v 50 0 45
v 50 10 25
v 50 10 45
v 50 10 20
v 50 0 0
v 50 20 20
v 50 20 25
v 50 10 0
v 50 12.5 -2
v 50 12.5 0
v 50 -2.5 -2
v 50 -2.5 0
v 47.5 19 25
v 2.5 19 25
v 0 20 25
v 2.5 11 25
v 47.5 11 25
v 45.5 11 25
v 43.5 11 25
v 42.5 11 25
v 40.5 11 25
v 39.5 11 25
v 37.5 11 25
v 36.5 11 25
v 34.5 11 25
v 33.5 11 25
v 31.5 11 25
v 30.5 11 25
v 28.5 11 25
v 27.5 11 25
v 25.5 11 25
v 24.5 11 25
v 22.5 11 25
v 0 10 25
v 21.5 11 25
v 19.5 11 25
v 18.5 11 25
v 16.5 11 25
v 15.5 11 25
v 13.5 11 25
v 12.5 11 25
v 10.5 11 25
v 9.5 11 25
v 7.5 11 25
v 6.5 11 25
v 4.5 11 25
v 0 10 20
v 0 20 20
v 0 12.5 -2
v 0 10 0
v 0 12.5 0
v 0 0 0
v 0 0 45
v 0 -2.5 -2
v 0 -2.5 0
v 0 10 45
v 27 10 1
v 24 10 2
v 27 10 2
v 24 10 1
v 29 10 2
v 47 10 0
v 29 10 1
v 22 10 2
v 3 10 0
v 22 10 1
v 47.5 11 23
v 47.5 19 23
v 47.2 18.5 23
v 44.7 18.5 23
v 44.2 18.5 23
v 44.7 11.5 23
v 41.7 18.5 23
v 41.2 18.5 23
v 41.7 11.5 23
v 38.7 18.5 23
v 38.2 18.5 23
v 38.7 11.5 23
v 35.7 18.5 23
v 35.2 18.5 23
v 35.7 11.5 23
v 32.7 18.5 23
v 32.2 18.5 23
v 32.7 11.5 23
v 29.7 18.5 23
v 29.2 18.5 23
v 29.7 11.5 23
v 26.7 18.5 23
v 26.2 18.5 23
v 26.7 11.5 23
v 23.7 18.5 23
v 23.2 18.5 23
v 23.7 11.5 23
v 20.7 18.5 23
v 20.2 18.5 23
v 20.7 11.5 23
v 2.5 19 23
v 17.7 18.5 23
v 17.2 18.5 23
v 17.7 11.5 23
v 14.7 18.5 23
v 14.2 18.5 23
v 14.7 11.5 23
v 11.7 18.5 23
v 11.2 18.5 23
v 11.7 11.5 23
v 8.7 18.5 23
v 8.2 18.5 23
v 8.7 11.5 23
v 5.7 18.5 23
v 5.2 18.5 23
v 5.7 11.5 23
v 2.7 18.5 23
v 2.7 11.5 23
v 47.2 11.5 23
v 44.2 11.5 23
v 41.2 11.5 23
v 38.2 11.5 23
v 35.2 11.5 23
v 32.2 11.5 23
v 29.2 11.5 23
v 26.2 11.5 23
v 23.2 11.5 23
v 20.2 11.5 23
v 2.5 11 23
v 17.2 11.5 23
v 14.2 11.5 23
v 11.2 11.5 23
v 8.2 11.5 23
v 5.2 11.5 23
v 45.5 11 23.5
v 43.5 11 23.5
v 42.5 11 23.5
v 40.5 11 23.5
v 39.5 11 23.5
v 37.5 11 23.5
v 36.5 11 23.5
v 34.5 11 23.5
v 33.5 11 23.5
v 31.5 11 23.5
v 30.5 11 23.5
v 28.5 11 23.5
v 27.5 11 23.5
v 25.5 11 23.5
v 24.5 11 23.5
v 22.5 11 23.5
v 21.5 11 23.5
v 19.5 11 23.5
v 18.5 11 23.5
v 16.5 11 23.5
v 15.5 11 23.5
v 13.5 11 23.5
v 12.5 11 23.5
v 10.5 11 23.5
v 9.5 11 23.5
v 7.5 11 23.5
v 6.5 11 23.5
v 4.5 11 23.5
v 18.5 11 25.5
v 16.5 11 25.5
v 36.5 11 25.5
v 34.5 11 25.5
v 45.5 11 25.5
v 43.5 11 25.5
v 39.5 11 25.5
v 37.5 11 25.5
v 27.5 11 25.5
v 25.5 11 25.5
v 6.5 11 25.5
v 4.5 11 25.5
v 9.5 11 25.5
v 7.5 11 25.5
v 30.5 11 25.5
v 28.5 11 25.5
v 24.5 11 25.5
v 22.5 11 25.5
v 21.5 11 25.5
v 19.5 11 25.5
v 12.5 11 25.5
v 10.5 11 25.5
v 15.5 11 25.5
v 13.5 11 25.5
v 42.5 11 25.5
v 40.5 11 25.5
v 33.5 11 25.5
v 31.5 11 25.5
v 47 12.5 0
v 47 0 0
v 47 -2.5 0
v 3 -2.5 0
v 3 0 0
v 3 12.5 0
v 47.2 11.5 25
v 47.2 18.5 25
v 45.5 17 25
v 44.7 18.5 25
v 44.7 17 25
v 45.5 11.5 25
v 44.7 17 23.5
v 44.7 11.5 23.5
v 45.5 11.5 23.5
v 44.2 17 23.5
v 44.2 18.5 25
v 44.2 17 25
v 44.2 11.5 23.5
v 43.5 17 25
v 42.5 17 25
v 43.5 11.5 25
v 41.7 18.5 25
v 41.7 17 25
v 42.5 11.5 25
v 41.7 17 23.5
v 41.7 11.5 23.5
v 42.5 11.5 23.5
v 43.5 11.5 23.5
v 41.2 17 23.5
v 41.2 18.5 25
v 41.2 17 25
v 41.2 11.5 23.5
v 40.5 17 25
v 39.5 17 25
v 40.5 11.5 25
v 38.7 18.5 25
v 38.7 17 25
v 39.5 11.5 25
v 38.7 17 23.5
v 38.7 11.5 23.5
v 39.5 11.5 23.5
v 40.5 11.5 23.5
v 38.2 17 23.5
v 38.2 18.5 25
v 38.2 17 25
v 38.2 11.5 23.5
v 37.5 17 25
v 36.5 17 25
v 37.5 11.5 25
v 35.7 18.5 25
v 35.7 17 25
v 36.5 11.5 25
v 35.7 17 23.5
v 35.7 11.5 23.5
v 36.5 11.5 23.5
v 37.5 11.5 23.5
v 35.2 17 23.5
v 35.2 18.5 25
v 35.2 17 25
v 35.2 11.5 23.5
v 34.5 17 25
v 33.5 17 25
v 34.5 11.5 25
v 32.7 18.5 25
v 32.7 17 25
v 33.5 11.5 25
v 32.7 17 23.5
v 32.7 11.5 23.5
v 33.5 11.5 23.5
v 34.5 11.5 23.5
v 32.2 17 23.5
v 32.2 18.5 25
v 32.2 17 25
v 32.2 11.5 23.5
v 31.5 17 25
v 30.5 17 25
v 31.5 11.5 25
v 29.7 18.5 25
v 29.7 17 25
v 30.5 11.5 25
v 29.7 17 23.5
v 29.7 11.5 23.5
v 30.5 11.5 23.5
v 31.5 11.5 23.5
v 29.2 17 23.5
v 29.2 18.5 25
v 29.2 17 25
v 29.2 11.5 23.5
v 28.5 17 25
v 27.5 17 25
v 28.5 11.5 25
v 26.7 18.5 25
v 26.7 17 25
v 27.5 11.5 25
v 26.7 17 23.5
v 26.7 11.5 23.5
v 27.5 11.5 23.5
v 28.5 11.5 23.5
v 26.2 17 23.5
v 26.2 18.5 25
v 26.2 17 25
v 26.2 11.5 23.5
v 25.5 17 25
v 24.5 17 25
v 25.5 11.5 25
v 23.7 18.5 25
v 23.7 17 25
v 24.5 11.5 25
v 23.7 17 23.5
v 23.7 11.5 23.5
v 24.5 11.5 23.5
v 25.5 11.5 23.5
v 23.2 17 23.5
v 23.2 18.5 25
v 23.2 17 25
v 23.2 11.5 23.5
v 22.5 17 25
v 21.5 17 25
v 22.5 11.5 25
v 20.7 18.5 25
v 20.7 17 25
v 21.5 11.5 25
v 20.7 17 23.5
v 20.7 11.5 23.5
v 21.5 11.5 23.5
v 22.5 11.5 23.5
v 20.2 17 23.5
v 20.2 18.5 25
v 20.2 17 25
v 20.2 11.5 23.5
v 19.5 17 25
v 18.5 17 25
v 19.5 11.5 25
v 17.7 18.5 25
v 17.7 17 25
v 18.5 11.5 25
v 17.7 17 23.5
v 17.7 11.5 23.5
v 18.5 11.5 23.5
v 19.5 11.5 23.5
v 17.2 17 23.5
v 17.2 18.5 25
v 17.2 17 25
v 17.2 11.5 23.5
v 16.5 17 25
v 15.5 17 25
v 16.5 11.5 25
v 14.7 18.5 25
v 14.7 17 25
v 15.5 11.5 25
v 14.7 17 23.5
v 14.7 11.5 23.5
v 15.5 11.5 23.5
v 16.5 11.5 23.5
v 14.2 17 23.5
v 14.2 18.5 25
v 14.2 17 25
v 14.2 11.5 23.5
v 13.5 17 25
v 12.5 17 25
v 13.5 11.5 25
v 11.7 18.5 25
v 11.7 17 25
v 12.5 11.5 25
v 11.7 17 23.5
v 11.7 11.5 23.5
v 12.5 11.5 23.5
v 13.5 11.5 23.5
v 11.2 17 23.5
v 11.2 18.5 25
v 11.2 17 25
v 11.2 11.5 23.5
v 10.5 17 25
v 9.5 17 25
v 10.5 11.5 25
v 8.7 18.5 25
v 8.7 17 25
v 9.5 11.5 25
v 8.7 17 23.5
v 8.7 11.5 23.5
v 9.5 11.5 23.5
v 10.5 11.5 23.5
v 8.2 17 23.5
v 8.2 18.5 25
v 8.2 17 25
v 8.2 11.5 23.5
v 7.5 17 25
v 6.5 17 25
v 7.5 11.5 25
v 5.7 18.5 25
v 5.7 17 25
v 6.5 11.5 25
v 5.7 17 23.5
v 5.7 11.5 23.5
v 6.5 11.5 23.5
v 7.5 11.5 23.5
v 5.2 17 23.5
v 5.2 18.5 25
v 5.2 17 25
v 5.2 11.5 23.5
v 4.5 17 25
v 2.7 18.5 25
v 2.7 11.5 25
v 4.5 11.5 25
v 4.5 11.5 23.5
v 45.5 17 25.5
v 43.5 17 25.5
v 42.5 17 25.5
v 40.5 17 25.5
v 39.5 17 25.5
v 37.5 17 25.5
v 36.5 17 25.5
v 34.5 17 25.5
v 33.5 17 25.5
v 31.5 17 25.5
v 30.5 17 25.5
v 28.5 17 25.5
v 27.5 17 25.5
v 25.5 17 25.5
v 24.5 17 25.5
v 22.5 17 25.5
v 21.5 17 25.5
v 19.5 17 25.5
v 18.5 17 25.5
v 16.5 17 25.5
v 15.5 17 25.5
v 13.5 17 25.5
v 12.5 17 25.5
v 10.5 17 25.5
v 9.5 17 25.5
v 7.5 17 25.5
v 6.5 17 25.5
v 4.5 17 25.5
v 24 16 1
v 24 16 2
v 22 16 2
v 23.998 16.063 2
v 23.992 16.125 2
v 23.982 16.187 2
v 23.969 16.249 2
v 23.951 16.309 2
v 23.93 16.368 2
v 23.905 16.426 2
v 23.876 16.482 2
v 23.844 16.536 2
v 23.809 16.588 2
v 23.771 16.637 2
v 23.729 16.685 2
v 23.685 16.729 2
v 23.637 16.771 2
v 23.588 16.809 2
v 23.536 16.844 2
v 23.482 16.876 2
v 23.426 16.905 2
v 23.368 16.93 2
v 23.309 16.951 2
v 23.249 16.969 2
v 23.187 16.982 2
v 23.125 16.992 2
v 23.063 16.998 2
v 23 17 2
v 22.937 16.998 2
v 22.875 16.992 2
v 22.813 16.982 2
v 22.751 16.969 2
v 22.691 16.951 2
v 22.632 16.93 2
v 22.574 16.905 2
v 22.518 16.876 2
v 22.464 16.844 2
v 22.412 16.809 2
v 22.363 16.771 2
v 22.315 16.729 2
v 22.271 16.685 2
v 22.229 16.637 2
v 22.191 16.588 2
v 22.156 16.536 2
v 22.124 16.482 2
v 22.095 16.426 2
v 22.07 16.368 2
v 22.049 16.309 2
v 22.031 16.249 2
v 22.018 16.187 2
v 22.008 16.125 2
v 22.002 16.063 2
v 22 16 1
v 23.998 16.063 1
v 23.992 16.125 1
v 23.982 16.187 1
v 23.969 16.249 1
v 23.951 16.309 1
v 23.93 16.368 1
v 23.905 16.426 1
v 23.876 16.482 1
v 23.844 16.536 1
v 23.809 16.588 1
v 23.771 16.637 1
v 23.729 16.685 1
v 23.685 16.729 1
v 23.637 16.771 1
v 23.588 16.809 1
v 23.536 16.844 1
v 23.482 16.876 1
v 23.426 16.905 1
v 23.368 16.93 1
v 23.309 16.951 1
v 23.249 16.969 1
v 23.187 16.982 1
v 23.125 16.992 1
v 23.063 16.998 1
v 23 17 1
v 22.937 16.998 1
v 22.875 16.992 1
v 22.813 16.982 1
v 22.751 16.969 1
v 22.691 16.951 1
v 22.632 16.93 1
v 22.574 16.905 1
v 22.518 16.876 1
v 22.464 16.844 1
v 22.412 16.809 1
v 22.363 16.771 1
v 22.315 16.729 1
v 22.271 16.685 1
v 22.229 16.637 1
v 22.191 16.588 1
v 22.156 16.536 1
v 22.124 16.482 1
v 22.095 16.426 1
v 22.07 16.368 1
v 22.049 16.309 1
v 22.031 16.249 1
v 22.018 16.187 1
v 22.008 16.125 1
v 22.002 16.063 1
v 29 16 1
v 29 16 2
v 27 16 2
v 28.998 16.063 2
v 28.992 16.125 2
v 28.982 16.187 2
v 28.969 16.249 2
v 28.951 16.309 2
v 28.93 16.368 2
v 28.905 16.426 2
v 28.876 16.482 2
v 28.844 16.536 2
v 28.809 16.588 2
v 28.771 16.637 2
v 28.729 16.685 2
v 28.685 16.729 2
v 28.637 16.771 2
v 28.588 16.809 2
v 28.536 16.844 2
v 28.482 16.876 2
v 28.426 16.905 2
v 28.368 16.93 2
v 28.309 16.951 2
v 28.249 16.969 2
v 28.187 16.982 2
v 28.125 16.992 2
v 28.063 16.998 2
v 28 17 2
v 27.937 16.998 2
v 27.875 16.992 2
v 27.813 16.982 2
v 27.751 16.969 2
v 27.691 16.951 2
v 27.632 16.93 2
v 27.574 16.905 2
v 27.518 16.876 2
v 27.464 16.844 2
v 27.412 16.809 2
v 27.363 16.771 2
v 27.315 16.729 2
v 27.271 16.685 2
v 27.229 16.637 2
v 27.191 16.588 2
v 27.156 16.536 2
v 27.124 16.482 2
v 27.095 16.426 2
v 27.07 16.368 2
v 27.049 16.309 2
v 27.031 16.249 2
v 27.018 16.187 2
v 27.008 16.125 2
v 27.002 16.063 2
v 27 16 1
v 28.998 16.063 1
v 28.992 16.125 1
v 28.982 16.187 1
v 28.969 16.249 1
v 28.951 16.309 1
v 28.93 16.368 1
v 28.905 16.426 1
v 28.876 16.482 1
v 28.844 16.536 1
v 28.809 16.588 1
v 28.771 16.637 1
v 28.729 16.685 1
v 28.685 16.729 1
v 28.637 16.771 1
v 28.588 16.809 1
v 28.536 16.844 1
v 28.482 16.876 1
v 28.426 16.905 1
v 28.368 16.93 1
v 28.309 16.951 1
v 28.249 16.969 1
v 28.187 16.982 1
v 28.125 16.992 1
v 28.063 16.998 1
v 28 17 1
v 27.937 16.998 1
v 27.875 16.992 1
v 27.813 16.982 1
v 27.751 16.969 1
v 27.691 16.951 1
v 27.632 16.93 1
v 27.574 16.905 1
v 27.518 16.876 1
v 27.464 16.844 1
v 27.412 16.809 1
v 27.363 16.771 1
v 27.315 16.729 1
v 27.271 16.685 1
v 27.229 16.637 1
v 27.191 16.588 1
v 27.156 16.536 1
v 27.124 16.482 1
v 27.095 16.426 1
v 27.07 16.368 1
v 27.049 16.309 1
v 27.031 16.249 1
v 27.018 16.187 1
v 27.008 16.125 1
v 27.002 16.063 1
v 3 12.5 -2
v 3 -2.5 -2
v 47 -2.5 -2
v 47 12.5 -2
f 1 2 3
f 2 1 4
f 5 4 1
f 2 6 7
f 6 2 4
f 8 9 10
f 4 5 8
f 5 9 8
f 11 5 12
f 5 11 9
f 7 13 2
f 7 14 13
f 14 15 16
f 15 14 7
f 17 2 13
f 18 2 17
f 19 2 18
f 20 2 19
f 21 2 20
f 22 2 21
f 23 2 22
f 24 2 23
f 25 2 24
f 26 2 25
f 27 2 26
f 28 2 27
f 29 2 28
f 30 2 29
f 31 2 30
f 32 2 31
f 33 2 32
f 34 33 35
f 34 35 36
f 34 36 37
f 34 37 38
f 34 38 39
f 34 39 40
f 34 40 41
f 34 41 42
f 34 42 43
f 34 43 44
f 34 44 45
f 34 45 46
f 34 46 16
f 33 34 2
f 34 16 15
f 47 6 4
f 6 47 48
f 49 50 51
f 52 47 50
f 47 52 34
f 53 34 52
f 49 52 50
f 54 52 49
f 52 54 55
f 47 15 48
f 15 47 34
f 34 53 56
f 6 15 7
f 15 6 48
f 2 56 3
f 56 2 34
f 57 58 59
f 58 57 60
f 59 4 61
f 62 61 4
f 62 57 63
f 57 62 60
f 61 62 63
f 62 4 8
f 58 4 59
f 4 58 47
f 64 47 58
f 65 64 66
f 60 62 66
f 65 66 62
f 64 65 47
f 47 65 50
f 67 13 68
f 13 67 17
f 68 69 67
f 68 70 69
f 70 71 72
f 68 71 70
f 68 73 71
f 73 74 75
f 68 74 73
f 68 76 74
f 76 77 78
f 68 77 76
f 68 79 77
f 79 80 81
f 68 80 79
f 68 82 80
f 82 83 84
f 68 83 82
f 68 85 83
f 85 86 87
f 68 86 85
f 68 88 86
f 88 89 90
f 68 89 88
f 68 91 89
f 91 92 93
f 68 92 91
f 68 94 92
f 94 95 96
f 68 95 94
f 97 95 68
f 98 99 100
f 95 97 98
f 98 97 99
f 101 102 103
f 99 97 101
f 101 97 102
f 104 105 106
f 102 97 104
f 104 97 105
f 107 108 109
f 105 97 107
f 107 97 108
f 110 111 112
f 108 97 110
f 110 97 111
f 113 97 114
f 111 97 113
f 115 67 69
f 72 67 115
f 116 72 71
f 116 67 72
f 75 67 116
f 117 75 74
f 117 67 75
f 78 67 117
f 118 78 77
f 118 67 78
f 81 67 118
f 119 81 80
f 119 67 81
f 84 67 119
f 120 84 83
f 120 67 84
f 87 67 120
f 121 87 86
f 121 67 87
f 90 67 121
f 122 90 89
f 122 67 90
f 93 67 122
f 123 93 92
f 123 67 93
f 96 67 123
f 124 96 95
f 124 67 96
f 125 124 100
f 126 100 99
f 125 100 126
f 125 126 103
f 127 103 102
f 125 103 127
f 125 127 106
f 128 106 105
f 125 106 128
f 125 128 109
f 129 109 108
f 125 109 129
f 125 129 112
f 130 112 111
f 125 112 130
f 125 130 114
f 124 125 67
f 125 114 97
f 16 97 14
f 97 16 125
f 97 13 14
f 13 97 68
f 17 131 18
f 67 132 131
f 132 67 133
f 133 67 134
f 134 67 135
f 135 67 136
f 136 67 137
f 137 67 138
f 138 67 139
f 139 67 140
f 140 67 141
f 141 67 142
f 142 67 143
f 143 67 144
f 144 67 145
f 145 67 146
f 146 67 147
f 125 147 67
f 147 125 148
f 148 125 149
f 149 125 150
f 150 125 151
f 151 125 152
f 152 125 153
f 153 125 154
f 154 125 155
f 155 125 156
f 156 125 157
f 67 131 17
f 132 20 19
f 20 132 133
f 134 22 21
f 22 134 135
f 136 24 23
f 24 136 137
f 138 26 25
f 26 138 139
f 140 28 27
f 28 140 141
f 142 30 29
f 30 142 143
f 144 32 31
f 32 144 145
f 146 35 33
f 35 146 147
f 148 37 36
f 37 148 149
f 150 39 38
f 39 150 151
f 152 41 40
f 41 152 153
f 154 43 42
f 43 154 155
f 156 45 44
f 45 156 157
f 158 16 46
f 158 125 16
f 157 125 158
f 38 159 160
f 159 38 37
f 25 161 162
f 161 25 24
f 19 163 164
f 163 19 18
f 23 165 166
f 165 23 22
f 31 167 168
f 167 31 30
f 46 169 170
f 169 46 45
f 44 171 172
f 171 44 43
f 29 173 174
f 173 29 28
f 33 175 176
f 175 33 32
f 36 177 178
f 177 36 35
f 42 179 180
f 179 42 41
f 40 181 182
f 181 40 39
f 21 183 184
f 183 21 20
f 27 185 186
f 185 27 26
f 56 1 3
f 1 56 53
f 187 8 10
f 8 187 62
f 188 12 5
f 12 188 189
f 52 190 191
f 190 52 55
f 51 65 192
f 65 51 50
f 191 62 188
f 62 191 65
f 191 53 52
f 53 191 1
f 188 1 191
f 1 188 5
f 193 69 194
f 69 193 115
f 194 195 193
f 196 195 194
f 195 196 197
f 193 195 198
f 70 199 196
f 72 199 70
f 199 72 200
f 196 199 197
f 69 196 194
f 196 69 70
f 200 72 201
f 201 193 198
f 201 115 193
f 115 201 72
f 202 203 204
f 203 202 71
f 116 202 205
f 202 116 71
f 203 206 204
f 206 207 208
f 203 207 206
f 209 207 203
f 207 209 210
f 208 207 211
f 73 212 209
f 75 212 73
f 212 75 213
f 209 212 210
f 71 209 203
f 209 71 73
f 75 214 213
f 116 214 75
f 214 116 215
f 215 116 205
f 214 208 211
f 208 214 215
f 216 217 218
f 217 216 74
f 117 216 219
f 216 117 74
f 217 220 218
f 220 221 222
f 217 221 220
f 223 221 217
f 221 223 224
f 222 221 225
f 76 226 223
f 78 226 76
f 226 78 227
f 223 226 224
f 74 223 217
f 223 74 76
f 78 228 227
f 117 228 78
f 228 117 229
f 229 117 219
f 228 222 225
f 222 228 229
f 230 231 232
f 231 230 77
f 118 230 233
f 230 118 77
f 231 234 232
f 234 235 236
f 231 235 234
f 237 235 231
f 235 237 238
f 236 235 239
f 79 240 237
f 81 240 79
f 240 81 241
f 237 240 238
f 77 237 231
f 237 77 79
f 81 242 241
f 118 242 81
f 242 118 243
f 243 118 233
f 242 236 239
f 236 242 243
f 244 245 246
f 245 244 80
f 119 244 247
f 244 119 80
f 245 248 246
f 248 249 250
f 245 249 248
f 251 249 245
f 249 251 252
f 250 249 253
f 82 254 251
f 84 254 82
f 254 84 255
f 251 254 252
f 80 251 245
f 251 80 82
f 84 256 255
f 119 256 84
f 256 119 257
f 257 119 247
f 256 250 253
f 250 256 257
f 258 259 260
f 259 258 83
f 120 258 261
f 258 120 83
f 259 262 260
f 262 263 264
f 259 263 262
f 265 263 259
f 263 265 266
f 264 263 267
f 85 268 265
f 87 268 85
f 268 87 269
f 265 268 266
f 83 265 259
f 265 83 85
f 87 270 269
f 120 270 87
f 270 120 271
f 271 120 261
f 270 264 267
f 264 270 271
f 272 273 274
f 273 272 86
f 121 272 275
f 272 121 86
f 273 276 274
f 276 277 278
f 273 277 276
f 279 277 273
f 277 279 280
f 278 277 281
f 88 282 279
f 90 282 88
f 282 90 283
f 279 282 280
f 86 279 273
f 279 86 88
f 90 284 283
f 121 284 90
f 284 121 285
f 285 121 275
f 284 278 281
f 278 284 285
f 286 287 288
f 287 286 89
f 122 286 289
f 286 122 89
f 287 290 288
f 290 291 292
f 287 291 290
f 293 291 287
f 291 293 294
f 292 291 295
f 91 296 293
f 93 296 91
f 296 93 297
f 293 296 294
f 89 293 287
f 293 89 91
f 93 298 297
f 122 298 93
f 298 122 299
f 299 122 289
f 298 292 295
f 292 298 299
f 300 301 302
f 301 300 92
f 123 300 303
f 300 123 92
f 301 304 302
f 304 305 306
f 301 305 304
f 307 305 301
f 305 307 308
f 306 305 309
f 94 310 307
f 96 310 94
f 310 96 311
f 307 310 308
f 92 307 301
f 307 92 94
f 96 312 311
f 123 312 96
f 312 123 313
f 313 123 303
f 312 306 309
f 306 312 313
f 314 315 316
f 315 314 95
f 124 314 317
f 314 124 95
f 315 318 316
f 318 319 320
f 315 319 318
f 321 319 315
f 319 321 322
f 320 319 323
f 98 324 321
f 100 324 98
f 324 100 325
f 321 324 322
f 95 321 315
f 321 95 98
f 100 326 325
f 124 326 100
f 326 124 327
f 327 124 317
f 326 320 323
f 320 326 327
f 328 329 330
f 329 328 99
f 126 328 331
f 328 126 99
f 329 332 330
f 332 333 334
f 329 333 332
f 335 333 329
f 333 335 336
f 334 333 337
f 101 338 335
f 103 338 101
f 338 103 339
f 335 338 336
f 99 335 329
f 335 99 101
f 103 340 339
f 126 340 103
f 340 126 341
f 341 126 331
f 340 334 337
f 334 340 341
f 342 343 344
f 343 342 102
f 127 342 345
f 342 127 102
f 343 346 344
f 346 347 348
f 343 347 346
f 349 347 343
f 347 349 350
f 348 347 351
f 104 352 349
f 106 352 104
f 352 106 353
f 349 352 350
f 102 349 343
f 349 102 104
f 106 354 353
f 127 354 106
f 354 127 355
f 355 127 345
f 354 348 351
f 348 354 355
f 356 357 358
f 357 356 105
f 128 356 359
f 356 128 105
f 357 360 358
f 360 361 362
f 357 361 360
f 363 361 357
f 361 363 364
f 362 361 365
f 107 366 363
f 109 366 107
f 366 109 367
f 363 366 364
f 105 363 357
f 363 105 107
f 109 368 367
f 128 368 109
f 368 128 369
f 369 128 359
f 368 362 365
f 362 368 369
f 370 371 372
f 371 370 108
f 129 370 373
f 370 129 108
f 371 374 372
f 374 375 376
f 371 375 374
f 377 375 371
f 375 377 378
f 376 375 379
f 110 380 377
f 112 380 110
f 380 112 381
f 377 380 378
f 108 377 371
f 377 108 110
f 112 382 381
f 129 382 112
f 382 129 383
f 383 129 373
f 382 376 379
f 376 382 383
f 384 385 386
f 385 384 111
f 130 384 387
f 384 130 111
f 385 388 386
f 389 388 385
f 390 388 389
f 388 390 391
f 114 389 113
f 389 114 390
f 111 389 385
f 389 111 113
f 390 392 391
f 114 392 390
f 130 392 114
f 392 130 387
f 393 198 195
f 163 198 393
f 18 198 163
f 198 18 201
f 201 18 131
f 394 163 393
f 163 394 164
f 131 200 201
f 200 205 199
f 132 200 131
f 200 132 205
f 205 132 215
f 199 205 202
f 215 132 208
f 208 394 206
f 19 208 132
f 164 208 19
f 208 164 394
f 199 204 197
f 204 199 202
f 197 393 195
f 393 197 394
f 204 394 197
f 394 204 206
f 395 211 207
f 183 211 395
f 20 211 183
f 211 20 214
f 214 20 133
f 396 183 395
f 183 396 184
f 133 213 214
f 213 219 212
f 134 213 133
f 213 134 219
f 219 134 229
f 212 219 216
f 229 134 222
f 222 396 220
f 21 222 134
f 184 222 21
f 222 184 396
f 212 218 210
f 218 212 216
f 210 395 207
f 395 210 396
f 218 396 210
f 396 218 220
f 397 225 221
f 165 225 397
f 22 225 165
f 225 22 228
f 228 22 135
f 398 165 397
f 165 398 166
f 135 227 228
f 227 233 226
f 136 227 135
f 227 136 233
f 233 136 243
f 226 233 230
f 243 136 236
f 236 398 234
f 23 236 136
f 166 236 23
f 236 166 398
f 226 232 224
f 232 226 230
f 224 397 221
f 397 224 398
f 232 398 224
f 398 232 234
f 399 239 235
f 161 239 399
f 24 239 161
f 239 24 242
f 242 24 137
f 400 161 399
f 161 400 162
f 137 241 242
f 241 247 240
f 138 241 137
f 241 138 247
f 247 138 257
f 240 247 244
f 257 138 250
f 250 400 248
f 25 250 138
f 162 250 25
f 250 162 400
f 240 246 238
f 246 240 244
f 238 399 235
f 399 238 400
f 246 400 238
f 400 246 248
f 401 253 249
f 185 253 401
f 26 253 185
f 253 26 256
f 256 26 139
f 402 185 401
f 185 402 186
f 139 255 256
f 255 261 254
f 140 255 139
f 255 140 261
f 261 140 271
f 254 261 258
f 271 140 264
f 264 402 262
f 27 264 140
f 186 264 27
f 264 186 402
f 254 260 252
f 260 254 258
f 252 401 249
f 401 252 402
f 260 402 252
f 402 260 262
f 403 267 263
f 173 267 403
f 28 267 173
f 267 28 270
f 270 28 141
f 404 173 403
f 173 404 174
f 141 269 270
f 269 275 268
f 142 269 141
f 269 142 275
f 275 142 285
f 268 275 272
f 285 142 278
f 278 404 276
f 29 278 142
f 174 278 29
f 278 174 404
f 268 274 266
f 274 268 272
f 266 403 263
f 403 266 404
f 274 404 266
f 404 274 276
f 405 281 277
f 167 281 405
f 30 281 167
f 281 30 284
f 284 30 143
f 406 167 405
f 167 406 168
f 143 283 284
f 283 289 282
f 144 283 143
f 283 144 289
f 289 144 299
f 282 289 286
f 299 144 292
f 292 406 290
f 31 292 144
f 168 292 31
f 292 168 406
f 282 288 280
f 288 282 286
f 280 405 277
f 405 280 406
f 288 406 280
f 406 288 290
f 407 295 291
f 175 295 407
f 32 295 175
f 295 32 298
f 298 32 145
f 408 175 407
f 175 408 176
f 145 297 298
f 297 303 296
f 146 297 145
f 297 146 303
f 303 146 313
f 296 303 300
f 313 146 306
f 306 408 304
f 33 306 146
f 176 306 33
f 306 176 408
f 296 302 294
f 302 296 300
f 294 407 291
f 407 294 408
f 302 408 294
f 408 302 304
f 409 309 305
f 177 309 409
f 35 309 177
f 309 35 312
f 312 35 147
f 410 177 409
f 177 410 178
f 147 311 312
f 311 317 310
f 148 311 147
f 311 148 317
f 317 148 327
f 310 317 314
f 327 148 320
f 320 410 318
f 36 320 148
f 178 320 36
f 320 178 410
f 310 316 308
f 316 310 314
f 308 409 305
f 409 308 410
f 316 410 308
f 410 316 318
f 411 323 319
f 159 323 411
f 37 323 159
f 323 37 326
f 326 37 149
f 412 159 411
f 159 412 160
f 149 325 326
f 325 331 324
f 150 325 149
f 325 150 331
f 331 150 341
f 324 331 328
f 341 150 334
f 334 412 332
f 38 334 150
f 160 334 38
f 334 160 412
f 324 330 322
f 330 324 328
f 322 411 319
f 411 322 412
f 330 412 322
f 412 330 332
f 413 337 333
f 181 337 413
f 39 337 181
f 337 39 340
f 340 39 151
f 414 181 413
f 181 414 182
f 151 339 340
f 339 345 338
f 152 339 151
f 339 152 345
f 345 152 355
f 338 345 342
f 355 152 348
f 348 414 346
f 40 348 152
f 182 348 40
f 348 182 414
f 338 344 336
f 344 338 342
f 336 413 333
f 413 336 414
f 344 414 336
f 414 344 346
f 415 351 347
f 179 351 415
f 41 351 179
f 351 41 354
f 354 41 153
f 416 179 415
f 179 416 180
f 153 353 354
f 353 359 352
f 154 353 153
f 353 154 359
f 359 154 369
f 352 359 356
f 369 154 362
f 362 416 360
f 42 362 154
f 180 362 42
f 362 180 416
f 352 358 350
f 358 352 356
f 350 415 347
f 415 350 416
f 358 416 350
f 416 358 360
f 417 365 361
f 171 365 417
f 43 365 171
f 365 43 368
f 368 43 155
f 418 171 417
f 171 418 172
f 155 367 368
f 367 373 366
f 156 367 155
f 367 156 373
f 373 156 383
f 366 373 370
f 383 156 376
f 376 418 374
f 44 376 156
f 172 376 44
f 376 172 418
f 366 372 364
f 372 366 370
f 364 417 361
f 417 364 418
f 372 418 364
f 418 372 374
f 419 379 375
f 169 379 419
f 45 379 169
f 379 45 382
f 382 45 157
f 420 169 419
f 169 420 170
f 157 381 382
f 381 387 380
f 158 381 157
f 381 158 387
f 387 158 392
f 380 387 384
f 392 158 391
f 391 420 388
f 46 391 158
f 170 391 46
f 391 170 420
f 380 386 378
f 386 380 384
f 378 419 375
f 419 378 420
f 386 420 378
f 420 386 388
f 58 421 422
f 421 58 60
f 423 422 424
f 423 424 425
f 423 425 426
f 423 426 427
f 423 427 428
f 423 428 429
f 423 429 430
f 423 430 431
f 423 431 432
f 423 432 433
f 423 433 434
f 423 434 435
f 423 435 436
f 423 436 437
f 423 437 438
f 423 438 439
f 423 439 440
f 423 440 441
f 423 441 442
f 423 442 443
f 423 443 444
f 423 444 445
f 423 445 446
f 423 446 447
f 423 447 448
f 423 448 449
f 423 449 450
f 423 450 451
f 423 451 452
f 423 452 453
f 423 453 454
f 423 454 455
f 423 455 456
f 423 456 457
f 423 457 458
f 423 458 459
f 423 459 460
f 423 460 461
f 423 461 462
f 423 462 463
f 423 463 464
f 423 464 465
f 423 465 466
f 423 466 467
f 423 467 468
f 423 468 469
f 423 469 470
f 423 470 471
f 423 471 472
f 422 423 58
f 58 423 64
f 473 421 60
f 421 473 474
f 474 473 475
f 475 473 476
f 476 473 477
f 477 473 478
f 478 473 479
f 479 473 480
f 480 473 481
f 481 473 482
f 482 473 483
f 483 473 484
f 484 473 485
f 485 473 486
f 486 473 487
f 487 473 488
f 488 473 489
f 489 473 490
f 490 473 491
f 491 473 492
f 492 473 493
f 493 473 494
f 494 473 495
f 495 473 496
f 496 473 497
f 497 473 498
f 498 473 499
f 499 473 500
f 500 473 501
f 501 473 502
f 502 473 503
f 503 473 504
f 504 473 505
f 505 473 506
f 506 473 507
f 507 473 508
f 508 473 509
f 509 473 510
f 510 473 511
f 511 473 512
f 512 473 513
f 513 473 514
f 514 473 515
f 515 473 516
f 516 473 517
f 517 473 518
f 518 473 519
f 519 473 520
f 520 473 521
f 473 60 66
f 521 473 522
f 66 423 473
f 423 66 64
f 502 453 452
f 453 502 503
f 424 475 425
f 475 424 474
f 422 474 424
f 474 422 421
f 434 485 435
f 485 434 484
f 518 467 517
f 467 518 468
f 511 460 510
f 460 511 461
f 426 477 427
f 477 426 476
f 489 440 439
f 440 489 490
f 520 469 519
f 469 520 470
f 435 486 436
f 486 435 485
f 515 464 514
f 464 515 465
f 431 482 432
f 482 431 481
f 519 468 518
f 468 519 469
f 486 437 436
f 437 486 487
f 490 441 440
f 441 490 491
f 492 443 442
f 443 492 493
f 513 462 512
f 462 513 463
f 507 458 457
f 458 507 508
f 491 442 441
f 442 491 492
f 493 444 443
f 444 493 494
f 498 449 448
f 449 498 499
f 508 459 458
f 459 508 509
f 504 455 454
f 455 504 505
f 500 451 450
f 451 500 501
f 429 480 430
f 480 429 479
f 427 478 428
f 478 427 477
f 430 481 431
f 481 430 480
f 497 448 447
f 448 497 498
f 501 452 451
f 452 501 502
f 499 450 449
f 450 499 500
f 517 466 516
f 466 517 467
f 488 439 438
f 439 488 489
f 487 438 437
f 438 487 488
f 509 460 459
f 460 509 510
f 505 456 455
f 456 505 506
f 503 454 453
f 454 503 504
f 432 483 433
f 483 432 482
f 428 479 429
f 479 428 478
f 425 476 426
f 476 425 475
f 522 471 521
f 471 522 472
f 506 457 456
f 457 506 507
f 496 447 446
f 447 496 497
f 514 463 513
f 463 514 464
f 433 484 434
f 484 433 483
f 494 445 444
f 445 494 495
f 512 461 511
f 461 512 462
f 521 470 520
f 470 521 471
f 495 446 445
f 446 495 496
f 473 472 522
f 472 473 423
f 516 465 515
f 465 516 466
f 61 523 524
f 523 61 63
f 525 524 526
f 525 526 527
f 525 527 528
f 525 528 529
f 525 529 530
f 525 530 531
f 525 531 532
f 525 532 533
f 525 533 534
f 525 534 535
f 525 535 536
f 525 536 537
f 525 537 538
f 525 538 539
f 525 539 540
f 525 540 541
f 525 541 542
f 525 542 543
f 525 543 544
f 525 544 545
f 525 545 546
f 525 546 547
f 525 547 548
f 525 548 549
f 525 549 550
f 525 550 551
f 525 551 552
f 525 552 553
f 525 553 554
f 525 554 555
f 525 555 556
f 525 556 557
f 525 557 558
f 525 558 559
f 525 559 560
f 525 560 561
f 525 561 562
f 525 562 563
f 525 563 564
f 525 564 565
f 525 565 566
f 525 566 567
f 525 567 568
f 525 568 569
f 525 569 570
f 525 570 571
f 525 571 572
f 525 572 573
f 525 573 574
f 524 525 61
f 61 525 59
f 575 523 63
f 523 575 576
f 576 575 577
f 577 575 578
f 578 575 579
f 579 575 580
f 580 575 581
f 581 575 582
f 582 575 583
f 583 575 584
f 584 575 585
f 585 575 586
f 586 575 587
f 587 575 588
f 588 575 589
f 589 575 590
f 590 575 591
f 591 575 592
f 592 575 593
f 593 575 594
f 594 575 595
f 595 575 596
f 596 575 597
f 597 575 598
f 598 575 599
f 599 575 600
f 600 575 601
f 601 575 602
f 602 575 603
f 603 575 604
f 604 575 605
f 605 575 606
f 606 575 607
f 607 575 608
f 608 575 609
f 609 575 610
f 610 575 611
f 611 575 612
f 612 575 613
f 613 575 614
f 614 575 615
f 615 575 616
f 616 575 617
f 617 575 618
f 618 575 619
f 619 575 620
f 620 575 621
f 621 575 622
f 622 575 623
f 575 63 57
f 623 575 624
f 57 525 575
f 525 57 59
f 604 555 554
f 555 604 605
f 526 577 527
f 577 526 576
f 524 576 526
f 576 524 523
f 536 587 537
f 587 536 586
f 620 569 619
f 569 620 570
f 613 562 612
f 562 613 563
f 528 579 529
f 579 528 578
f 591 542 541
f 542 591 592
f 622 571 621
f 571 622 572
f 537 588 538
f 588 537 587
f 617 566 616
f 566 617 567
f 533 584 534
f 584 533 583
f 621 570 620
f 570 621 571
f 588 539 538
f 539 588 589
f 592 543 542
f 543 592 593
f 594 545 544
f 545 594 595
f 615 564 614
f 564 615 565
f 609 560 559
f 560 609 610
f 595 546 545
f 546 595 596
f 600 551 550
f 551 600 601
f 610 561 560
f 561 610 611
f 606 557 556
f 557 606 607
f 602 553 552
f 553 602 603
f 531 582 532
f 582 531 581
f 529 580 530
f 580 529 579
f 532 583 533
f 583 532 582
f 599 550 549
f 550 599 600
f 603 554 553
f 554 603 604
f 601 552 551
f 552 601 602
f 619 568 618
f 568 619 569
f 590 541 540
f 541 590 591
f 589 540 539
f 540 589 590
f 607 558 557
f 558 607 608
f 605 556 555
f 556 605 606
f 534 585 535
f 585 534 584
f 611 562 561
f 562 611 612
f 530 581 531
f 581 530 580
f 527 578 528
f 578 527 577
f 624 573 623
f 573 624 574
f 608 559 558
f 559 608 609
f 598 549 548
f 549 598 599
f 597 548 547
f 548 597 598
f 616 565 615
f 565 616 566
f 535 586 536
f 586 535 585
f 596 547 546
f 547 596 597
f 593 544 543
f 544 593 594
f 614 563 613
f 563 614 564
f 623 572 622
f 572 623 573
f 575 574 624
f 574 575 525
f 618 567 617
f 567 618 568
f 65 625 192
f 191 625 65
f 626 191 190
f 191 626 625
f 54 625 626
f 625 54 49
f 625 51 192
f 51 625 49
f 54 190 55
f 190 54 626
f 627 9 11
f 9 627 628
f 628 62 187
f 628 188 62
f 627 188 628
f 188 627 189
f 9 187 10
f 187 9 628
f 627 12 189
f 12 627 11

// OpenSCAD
$fn=100;
//корпус
color ("brown") {
cube ([50,10,45]);
difference () {
translate ([0,10,20])cube ([50,10,5]);
translate ([2.5,11,23])cube ([45,8,6]);
 }
}
//клавиши
color ([1,1,1]){
for ( i = [1 : 15] ) {
translate ([47.7-3*i,11.5,23])cube ([2.5,7,2]);
 }
}
color ([0,0,0]){
for ( i = [1 : 14] ) {
translate ([46.5-3*i,11,23.5])cube ([2,6,2]);
 }
}
//педали
translate ([22,1,1])cube ([2,15,1]);
translate ([23,16,1])cylinder ([1,3,3]);

translate ([27,1,1])cube ([2,15,1]);
translate ([28,16,1])cylinder ([1,3,3]);
//ножки
color ("lime") 
translate ([0,-2.5,-2])cube ([3,15,2]);
color ("lime")
translate ([47,-2.5,-2])cube ([3,15,2]);
